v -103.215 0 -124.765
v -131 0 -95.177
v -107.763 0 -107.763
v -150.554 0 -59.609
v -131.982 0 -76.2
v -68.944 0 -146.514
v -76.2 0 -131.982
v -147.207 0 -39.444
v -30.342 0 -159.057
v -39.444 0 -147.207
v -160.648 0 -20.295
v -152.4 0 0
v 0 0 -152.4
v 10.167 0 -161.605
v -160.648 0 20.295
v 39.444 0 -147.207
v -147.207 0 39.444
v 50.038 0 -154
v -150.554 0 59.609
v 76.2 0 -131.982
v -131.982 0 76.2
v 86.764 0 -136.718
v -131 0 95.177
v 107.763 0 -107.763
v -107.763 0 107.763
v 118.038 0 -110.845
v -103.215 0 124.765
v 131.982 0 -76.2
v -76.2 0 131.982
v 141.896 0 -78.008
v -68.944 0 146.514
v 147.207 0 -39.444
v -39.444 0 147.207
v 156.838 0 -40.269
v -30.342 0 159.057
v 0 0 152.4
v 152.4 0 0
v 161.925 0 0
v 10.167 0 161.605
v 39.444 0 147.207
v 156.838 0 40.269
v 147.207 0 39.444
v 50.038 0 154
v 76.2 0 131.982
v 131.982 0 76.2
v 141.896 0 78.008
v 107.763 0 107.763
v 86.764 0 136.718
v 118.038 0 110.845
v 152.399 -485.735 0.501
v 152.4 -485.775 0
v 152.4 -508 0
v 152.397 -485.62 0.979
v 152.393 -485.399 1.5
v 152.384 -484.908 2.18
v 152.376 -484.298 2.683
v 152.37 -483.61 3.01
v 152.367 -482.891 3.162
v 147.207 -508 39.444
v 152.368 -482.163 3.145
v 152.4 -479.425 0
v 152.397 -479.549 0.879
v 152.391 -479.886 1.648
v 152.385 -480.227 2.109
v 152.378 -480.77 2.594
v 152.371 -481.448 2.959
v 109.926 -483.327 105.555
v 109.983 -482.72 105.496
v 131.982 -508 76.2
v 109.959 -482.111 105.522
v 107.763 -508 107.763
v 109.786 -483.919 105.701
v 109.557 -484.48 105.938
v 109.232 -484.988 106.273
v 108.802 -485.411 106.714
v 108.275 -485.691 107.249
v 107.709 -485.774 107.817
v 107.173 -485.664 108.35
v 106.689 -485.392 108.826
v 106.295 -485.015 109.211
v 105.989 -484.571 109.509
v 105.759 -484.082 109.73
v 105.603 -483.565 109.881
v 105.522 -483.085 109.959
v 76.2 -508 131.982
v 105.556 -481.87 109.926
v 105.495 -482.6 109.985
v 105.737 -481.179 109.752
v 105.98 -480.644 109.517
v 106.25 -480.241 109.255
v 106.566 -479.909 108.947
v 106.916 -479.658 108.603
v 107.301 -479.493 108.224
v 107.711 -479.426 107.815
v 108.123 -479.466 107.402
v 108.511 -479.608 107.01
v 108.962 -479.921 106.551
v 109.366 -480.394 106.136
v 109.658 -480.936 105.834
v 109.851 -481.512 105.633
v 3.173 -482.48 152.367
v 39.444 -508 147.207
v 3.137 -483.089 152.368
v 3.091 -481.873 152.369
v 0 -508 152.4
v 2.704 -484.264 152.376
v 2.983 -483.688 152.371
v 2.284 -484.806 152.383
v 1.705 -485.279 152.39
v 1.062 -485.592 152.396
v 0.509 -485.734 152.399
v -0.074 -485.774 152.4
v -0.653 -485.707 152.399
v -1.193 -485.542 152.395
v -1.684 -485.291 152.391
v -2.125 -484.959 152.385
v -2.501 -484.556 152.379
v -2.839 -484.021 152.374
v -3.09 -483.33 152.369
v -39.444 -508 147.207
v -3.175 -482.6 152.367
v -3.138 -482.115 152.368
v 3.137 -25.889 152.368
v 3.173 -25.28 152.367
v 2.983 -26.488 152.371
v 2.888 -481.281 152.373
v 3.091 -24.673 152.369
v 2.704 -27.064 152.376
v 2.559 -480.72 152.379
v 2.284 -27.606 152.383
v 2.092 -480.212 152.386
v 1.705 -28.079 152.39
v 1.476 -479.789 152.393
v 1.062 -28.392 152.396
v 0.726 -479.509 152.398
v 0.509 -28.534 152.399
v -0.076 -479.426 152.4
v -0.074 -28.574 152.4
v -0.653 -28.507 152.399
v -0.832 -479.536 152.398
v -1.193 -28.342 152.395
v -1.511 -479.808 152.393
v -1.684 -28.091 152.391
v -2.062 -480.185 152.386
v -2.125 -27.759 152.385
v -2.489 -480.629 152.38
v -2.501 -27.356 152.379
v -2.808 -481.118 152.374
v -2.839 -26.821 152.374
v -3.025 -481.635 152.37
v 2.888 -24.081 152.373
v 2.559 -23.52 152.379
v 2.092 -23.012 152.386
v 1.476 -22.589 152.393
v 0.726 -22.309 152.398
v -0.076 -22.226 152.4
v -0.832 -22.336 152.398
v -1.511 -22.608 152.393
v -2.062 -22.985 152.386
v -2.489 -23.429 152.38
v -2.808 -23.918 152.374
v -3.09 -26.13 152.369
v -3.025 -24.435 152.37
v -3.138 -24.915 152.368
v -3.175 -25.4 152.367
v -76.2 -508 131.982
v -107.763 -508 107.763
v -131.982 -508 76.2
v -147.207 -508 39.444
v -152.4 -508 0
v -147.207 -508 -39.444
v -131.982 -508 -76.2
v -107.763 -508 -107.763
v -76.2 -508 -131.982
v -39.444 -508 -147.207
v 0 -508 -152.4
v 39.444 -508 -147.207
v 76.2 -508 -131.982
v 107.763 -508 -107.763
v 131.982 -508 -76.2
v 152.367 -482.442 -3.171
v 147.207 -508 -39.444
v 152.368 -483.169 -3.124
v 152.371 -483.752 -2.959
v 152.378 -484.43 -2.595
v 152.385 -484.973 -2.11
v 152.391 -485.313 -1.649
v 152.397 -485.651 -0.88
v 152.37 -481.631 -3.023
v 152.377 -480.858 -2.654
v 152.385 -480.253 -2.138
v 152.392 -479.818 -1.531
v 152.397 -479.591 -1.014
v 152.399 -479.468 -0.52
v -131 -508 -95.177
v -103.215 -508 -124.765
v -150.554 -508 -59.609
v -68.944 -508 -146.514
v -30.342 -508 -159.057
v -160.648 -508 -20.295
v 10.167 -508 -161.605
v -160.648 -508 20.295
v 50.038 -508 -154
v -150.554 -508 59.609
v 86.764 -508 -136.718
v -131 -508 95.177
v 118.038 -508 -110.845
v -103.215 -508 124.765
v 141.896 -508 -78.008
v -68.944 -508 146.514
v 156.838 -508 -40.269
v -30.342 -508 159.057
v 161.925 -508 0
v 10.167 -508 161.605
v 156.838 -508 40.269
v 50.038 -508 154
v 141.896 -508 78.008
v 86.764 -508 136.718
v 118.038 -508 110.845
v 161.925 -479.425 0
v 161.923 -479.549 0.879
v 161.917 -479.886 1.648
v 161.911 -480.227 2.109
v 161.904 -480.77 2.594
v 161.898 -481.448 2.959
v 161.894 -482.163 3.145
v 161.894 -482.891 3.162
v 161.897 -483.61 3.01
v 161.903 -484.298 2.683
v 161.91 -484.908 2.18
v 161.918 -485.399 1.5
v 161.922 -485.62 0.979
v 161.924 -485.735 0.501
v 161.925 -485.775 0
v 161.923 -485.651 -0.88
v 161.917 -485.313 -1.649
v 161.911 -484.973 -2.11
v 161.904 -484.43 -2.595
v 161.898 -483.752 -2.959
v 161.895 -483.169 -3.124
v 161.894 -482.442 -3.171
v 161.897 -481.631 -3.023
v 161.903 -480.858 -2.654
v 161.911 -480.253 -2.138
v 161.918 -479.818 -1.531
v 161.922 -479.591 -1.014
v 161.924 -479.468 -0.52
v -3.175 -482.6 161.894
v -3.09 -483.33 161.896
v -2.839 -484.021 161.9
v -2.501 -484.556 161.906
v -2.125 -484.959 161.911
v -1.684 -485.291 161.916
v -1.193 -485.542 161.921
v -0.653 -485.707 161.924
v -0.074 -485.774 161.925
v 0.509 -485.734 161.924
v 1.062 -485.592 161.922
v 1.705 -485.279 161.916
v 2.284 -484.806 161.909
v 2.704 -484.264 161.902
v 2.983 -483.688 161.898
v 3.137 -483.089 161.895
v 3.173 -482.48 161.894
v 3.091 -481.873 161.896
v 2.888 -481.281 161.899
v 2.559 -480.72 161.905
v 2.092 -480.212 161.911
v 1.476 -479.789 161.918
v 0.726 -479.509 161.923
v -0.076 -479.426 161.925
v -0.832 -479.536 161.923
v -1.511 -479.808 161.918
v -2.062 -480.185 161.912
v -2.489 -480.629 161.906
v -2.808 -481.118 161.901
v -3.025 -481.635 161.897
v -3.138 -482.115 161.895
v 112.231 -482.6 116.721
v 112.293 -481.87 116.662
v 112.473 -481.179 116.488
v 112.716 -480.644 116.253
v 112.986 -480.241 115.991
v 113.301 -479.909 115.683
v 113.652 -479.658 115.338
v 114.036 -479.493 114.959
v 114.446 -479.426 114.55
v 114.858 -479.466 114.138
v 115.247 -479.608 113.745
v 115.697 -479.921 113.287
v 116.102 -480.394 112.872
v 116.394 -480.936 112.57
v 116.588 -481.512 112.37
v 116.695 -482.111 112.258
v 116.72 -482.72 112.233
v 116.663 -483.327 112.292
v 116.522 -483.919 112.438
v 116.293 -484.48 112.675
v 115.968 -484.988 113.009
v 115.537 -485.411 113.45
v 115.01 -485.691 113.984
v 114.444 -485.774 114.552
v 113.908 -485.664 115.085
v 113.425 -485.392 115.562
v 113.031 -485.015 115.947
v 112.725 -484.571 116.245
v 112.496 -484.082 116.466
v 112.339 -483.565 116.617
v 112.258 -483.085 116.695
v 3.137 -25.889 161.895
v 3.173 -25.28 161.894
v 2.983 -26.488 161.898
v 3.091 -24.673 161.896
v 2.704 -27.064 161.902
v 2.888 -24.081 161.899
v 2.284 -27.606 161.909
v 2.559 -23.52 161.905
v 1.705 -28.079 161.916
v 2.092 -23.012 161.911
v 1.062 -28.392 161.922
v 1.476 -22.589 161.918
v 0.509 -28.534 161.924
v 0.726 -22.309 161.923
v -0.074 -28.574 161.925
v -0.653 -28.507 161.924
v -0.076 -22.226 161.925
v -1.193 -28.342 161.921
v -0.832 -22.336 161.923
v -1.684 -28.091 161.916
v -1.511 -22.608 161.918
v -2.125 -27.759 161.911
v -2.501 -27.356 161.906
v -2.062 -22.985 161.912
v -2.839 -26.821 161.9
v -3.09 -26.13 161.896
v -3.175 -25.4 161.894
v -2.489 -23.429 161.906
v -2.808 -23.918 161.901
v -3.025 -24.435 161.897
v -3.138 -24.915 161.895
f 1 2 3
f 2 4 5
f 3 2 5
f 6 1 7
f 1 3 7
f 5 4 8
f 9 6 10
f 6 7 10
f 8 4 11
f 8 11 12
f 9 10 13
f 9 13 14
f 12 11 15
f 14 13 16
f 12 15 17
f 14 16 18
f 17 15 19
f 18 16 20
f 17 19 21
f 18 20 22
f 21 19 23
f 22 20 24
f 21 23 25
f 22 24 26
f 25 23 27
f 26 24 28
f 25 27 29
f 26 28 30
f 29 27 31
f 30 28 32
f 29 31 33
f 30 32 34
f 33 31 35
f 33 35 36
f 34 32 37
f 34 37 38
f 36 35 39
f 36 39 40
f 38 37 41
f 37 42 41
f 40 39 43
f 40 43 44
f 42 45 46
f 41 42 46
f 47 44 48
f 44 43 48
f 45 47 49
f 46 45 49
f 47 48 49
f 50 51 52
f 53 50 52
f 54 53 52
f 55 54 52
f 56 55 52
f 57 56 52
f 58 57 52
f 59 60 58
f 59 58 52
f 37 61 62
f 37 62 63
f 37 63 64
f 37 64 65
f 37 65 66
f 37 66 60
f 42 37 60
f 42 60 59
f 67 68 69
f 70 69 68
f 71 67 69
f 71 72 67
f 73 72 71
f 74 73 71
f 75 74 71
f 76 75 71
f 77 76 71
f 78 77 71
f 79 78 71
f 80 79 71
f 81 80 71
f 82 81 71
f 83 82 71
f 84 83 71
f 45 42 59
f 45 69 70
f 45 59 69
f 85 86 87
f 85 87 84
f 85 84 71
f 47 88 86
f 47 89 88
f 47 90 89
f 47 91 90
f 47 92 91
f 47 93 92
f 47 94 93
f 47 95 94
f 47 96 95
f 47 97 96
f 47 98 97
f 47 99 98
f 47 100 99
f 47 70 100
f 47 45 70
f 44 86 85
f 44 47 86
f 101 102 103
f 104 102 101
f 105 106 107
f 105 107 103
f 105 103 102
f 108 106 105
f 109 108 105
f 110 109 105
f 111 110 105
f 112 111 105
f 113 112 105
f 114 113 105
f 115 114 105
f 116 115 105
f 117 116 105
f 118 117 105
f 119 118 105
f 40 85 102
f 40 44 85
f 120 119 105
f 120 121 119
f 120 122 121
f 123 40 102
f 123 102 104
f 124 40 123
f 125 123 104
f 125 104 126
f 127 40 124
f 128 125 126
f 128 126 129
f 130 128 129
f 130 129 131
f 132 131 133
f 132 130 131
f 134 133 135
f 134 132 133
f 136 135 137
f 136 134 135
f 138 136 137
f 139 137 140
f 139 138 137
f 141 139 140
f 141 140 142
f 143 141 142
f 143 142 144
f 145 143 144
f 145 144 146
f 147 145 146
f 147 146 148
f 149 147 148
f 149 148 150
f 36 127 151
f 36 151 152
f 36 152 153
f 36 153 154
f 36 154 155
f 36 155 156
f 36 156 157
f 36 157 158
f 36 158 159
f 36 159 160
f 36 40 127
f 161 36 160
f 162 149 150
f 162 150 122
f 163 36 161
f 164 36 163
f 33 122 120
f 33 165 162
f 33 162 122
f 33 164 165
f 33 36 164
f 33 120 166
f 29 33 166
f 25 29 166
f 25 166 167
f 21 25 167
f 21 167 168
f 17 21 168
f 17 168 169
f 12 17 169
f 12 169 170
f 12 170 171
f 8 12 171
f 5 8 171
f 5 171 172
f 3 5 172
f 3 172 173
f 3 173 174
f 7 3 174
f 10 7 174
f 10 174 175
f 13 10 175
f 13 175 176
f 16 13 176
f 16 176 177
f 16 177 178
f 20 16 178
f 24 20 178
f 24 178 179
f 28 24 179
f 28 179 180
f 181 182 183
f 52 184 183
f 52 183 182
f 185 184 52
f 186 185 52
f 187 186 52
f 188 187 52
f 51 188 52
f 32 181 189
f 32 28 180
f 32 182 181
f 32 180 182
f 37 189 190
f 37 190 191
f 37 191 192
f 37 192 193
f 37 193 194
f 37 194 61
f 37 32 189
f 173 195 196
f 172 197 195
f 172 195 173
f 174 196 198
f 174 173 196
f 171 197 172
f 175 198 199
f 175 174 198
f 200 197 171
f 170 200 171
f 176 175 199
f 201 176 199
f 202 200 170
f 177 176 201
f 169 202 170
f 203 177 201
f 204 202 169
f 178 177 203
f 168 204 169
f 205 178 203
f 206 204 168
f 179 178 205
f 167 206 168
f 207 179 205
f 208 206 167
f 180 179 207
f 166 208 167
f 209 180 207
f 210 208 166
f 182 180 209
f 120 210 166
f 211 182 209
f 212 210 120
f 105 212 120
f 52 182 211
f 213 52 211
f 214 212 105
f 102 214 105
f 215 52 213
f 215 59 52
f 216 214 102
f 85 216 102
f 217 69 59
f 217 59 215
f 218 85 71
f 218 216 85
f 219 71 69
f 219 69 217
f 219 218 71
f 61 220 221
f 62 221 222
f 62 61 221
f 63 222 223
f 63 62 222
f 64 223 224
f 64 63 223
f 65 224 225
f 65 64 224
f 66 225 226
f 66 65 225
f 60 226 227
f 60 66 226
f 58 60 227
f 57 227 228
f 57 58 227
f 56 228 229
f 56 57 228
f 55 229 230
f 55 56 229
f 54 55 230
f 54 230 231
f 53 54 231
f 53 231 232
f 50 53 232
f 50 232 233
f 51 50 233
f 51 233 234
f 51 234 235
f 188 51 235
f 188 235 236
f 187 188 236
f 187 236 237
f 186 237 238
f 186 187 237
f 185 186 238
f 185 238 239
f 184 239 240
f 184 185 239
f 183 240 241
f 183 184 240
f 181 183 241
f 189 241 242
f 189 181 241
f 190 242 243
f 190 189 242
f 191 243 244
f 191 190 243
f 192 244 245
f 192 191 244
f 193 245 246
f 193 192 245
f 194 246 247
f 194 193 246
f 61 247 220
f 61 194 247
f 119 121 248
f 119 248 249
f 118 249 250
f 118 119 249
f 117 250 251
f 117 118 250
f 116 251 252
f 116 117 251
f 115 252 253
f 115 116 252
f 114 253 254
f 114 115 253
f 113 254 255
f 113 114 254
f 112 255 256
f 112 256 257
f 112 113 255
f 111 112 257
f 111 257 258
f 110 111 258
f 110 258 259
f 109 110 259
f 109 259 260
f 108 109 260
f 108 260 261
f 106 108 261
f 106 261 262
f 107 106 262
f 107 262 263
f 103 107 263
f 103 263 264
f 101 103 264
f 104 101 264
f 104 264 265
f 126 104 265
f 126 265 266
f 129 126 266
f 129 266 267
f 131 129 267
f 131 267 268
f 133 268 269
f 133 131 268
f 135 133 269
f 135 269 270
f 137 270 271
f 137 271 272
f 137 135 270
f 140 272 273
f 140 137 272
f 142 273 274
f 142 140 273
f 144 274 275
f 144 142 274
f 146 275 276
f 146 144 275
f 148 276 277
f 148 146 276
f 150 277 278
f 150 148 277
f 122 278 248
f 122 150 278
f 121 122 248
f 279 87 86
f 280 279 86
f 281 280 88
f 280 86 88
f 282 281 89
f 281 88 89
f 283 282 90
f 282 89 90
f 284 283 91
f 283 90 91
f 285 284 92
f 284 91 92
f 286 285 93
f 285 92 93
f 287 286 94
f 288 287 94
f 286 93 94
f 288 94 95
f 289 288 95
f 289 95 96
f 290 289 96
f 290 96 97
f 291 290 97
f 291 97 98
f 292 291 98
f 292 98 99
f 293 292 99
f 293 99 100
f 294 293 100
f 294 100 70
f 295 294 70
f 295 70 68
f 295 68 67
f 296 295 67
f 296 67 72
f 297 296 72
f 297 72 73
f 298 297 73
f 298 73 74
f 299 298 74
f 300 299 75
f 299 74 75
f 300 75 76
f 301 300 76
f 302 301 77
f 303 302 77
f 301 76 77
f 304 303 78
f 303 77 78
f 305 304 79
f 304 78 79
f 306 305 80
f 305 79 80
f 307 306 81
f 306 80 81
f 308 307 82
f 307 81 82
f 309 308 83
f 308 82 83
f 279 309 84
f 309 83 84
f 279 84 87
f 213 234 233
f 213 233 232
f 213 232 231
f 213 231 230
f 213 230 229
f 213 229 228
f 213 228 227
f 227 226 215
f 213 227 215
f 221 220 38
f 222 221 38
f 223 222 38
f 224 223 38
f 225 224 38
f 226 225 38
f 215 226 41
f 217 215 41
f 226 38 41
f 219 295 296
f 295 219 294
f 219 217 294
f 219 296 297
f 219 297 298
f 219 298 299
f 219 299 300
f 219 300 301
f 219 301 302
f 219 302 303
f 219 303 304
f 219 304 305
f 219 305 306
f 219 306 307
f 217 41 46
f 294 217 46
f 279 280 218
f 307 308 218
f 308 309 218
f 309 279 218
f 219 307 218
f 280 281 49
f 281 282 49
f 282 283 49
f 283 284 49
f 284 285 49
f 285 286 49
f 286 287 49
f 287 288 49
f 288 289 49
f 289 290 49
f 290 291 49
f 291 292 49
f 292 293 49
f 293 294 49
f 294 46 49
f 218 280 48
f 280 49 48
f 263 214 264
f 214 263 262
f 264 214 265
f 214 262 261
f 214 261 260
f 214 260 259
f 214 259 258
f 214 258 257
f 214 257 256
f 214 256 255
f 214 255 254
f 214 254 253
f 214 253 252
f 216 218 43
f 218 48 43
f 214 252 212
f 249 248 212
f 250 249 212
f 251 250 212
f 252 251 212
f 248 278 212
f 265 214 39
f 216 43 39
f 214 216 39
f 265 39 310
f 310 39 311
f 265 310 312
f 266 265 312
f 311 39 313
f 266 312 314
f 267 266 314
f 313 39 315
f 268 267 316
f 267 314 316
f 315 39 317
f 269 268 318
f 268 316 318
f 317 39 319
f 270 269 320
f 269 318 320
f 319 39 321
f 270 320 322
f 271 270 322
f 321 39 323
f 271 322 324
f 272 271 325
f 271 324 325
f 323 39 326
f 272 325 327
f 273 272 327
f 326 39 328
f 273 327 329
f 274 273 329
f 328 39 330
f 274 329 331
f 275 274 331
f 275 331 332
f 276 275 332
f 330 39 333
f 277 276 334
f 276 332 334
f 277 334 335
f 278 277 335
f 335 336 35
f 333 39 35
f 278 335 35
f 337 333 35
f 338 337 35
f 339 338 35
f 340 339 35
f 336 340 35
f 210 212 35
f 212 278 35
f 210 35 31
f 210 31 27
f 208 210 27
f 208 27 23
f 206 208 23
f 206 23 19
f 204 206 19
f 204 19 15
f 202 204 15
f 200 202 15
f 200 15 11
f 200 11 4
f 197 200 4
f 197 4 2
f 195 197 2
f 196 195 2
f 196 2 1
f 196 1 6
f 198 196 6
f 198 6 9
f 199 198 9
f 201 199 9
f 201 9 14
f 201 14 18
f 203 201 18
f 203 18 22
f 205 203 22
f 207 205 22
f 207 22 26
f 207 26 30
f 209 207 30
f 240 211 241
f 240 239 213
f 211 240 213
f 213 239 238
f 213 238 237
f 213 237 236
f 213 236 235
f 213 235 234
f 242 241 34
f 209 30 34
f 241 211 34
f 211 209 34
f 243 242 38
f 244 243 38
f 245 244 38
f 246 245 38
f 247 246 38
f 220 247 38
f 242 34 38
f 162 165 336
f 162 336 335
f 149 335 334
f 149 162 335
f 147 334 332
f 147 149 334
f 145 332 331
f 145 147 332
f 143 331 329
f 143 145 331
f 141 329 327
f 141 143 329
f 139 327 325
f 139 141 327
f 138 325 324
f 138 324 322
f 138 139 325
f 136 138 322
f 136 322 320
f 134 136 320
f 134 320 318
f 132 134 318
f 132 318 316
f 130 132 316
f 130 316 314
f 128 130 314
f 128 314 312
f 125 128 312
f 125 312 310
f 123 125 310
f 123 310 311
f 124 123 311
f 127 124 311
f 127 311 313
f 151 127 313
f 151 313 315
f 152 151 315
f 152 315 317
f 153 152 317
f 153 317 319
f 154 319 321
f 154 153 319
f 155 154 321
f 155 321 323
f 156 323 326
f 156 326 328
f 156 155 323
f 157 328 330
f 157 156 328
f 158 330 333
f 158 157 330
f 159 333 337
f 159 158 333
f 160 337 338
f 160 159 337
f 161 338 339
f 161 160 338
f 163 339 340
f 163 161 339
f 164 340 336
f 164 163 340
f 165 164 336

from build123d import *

# Parameters (mm, degrees)
SKETCH12_R                    = 161.925
SKETCH12_R_2                  = 152.4
PIPE_STANDARD_S40_P12_2_DEPTH = 508
SKETCH13_R                    = 3.175
CUT_EXTRUDE1_DEPTH            = 558.228329547
SKETCH15_R                    = 3.175
CUT_EXTRUDE2_DEPTH            = 558.228329706
SKETCH16_R                    = 3.175
CUT_EXTRUDE3_DEPTH            = 558.228329706


with BuildPart() as part:
    # Sketch12 → Pipe (standard, s40) P12(2) (new body)
    with BuildSketch(Plane.XZ):
        Circle(SKETCH12_R)
        Circle(SKETCH12_R_2, mode=Mode.SUBTRACT)
    extrude(amount=PIPE_STANDARD_S40_P12_2_DEPTH)

    # Sketch13 → Cut-Extrude1 (cut, through all)
    with BuildSketch(Plane.XY):
        with Locations(Location((0, -482.6, 0), (0, 0, 180))):
            Circle(SKETCH13_R)
        with Locations(Location((0, -25.4, 0), (0, 0, 180))):
            Circle(SKETCH13_R)
    extrude(amount=CUT_EXTRUDE1_DEPTH, mode=Mode.SUBTRACT)

    # Sketch15 → Cut-Extrude2 (cut, through all)
    with BuildSketch(Plane(origin=(0, 0, 0), x_dir=(0, -1, 0), z_dir=(-0.7071067811865438, 0, -0.7071067811865512))):
        with Locations(Location((482.6, 0, 0), (0, 0, 90))):
            Circle(SKETCH15_R)
    extrude(amount=-CUT_EXTRUDE2_DEPTH, mode=Mode.SUBTRACT)

    # Sketch16 → Cut-Extrude3 (cut, through all)
    with BuildSketch(Plane(origin=(0, 0, 0), x_dir=(0, 0, -1), z_dir=(1, 0, 0))):
        with Locations(Location((0, -482.6, 0), (0, 0, 90.000000043))):
            Circle(SKETCH16_R)
    extrude(amount=CUT_EXTRUDE3_DEPTH, mode=Mode.SUBTRACT)


solid = part.part
